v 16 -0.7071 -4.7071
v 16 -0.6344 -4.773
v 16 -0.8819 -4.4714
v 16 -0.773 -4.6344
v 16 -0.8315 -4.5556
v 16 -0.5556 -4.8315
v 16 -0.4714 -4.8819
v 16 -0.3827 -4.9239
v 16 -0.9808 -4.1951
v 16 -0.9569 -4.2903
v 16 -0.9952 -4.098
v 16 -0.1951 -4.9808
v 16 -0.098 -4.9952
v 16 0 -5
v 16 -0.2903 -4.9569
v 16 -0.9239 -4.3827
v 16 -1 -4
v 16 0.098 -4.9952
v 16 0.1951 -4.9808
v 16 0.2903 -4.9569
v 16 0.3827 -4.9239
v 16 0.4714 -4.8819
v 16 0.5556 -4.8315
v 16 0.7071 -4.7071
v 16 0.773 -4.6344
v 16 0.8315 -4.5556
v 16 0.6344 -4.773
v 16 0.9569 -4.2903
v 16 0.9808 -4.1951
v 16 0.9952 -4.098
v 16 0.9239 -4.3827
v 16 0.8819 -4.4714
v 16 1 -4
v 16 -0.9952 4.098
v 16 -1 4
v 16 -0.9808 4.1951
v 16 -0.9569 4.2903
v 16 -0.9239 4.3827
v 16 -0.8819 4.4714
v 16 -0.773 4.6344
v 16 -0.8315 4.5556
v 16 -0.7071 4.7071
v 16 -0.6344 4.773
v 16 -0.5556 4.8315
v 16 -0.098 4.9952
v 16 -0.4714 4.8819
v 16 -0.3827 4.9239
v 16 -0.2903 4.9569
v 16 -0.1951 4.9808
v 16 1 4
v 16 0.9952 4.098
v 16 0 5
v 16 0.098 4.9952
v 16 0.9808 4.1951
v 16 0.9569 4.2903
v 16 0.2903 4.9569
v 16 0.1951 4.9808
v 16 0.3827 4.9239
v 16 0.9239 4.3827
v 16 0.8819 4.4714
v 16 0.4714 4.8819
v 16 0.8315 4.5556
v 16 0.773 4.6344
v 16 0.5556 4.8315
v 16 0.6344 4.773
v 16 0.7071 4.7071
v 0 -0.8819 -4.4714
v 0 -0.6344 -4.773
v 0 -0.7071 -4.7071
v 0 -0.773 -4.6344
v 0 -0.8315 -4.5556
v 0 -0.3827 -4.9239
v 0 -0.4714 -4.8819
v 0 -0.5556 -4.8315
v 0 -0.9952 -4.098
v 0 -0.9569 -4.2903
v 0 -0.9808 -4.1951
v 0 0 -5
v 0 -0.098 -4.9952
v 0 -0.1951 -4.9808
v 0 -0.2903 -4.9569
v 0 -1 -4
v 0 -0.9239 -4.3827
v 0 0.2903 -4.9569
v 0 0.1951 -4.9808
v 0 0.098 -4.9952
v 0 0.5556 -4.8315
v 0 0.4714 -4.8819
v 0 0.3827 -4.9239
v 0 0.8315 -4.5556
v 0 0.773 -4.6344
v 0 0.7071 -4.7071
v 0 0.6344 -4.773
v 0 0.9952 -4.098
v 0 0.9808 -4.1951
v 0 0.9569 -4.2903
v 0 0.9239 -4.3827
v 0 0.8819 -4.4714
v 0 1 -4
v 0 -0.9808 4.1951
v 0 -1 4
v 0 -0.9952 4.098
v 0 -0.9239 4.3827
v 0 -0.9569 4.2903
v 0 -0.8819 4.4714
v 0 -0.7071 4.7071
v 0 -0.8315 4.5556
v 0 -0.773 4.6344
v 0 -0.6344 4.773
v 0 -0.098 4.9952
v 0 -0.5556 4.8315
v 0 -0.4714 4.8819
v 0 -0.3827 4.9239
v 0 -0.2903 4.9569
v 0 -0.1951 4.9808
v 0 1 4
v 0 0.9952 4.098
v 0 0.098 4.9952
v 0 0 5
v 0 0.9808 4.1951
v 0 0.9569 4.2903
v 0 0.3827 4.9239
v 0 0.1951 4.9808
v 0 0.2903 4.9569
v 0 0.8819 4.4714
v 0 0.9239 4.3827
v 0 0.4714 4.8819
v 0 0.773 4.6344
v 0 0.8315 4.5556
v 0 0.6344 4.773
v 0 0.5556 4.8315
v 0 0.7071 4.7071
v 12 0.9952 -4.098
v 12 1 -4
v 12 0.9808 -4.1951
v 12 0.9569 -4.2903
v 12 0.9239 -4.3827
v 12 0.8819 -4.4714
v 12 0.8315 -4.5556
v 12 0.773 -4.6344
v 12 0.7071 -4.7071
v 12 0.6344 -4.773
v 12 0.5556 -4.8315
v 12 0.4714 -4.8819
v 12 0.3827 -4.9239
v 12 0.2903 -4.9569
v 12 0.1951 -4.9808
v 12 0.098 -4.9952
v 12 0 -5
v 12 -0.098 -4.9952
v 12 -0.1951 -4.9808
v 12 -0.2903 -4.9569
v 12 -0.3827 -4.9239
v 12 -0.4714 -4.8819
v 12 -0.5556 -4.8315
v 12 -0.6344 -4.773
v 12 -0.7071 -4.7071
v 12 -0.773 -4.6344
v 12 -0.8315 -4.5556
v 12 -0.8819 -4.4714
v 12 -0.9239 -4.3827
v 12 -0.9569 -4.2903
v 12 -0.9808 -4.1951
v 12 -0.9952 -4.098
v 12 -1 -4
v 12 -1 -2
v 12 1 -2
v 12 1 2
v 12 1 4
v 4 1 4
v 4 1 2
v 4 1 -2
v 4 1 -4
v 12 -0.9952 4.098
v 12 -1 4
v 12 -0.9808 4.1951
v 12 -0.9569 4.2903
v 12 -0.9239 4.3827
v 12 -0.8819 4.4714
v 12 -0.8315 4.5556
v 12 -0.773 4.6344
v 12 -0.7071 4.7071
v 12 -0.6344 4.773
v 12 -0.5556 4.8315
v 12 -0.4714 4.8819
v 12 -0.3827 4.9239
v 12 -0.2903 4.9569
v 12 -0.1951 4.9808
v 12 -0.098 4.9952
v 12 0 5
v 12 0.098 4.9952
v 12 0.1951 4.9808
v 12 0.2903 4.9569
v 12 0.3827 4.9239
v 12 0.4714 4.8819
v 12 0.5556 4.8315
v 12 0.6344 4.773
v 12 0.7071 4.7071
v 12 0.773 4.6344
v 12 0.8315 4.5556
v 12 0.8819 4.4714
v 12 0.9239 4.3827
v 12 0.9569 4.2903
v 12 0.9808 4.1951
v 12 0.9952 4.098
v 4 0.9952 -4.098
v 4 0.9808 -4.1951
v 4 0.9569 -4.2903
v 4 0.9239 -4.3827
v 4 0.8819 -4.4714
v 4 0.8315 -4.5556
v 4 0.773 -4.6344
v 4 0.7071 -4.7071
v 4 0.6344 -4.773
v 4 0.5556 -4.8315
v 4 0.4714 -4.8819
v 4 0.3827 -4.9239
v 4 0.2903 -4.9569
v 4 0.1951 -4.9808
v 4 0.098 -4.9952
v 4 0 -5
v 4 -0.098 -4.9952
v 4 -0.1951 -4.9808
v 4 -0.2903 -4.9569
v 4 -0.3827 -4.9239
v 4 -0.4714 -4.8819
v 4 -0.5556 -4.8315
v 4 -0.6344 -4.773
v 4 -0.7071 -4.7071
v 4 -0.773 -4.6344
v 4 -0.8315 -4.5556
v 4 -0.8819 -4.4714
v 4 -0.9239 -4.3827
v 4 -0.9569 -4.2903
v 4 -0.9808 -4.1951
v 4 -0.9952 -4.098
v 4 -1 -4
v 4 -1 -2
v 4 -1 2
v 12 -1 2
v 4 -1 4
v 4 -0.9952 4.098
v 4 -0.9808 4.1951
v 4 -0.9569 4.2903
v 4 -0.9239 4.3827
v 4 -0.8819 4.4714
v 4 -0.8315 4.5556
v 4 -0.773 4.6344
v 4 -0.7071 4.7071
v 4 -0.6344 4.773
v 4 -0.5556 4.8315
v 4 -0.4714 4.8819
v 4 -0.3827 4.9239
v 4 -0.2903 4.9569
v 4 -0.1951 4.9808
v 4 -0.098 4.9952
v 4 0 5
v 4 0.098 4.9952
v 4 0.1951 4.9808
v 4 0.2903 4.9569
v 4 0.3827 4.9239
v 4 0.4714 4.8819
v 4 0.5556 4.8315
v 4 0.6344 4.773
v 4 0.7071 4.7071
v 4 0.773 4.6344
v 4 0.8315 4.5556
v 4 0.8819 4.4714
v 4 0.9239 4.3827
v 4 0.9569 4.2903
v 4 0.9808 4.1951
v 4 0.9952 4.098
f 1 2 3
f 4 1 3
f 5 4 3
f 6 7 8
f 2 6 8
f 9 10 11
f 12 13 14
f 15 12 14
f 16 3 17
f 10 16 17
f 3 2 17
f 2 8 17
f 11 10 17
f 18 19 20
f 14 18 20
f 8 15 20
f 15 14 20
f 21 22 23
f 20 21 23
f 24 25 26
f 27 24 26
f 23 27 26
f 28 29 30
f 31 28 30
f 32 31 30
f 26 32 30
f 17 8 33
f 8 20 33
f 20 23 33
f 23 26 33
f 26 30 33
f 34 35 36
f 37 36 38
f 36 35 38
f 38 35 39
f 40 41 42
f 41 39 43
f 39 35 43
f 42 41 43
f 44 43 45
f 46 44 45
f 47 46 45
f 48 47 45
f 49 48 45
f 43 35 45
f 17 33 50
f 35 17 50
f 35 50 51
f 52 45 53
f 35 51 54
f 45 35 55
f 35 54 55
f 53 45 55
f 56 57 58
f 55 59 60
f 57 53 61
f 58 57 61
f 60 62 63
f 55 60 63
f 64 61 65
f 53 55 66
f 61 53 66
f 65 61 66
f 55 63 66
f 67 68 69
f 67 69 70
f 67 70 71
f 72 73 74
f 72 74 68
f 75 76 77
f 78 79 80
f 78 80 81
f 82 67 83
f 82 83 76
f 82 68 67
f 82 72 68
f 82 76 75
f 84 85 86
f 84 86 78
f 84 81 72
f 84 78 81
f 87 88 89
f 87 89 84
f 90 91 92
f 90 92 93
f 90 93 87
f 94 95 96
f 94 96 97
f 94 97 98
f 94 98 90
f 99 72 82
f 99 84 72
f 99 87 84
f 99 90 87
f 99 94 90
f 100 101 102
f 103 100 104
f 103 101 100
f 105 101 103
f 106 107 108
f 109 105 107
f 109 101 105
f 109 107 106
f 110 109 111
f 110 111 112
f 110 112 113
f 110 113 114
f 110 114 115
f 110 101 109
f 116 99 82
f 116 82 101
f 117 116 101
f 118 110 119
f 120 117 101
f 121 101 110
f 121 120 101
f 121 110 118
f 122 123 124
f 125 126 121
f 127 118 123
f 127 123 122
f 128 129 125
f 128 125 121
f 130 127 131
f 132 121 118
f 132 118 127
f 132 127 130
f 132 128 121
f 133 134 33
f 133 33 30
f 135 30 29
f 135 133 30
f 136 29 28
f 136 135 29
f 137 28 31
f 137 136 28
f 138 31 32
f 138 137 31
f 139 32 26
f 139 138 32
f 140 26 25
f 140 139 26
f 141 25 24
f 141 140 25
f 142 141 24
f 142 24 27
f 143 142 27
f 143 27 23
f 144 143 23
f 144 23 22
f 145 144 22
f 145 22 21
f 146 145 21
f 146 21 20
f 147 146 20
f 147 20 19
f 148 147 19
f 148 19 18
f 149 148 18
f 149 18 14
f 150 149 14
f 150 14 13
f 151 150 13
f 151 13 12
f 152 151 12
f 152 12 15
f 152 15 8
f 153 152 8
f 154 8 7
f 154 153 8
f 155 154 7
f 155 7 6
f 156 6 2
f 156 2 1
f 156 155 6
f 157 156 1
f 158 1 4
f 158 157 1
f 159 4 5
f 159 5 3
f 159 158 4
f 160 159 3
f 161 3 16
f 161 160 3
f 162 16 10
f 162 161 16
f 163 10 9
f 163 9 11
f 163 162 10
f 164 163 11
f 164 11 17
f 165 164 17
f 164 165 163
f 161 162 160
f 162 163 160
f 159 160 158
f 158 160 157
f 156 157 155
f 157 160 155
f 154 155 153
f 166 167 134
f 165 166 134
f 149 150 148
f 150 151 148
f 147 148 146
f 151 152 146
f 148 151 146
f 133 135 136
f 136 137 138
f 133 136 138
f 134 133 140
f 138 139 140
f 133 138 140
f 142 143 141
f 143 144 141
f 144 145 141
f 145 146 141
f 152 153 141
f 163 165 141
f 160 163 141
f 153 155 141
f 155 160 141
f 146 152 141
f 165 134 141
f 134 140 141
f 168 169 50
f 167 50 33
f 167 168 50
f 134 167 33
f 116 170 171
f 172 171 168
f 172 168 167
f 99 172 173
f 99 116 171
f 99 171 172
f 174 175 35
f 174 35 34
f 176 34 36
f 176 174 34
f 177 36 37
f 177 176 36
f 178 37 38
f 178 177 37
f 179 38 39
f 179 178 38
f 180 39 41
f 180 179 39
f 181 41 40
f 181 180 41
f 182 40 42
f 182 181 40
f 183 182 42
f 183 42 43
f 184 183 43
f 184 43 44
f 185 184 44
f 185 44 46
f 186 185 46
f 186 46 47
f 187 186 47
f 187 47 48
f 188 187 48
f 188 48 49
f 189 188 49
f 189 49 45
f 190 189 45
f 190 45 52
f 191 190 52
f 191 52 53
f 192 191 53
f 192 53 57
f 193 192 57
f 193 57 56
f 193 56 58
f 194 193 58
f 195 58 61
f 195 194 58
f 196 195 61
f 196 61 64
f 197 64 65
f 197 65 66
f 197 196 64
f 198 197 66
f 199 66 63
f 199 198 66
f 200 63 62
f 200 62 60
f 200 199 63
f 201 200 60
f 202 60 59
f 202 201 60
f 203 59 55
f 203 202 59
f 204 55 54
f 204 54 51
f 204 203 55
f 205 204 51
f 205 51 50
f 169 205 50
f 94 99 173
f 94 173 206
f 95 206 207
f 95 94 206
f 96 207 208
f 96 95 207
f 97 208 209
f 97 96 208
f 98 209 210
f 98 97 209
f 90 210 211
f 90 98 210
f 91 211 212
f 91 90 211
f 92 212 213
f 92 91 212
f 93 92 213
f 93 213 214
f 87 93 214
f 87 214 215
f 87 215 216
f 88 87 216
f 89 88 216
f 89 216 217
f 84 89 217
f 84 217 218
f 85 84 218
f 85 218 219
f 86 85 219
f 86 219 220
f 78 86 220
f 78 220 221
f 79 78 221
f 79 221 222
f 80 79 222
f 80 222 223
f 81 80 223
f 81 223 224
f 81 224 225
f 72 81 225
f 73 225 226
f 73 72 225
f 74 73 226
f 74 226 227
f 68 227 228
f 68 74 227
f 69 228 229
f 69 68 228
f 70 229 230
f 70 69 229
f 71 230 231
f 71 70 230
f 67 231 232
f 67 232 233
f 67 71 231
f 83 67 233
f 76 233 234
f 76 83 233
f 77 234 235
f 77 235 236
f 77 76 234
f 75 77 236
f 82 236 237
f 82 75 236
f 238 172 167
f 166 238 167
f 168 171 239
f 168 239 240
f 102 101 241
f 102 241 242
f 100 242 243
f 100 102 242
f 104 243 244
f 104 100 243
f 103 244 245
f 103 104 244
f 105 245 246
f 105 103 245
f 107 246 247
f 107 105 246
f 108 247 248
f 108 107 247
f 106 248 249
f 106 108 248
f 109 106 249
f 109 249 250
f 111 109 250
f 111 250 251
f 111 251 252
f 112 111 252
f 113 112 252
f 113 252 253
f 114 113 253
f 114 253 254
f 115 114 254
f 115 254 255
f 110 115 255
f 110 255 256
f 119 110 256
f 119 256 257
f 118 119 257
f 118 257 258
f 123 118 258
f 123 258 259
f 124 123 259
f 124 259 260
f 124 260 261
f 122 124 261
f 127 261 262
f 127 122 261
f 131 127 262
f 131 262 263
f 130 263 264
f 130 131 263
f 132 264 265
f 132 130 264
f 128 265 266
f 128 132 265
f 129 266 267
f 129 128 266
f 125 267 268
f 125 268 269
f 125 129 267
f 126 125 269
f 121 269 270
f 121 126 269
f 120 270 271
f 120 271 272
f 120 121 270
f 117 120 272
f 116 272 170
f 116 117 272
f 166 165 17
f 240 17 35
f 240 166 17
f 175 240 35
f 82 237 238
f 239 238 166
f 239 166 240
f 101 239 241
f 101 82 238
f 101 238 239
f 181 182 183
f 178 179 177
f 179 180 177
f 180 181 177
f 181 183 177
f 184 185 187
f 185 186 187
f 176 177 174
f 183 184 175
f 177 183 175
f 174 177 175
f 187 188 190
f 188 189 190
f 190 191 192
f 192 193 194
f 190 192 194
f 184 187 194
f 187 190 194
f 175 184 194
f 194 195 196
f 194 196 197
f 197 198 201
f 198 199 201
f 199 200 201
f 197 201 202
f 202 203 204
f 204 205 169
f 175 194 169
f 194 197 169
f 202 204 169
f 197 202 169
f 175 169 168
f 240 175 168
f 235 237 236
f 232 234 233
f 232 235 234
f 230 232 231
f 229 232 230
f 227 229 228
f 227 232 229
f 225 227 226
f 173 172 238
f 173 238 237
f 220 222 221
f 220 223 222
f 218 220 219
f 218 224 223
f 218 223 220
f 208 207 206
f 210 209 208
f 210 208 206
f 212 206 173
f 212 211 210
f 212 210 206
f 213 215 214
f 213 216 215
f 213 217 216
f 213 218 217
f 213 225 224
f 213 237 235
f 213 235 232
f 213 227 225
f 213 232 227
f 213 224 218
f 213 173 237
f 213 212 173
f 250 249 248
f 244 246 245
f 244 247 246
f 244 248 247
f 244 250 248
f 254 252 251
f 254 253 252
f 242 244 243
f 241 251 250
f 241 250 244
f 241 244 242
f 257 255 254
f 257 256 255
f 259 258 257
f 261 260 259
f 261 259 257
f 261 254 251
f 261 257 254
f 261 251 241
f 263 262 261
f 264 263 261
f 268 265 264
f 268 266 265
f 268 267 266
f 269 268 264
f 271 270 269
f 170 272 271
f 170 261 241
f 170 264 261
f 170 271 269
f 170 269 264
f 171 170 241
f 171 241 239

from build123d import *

# Parameters (mm, degrees)
EXTRUDE_1_DEPTH     = 16
SKETCH_2_W          = 8
SKETCH_2_H          = 9.708819165
SKETCH_2_H_2        = 9.650339741
CUT_EXTRUDE_1_DEPTH = 14


with BuildPart() as part:
    # 草图1 → 凸台-拉伸1 (new body)
    with BuildSketch(Plane(origin=(0, 0, 0), x_dir=(0, 0, -1), z_dir=(1, 0, 0))):
        with BuildLine():
            Line((-4, 1), (4, 1))
            ThreePointArc((4, 1), (5, 0), (4, -1))
            Line((4, -1), (-4, -1))
            ThreePointArc((-4, -1), (-5, 0), (-4, 1))
        make_face()
    extrude(amount=EXTRUDE_1_DEPTH)

    # 草图2 → 切除-拉伸1 (cut)
    with BuildSketch(Plane(origin=(0, 1, 0), x_dir=(1, 0, 0), z_dir=(0, 1, 0))):
        with Locations((8, 6.854409583)):
            Rectangle(SKETCH_2_W, SKETCH_2_H)
        with Locations((8, -6.825169871)):
            Rectangle(SKETCH_2_W, SKETCH_2_H_2)
    extrude(amount=-CUT_EXTRUDE_1_DEPTH, mode=Mode.SUBTRACT)


solid = part.part
